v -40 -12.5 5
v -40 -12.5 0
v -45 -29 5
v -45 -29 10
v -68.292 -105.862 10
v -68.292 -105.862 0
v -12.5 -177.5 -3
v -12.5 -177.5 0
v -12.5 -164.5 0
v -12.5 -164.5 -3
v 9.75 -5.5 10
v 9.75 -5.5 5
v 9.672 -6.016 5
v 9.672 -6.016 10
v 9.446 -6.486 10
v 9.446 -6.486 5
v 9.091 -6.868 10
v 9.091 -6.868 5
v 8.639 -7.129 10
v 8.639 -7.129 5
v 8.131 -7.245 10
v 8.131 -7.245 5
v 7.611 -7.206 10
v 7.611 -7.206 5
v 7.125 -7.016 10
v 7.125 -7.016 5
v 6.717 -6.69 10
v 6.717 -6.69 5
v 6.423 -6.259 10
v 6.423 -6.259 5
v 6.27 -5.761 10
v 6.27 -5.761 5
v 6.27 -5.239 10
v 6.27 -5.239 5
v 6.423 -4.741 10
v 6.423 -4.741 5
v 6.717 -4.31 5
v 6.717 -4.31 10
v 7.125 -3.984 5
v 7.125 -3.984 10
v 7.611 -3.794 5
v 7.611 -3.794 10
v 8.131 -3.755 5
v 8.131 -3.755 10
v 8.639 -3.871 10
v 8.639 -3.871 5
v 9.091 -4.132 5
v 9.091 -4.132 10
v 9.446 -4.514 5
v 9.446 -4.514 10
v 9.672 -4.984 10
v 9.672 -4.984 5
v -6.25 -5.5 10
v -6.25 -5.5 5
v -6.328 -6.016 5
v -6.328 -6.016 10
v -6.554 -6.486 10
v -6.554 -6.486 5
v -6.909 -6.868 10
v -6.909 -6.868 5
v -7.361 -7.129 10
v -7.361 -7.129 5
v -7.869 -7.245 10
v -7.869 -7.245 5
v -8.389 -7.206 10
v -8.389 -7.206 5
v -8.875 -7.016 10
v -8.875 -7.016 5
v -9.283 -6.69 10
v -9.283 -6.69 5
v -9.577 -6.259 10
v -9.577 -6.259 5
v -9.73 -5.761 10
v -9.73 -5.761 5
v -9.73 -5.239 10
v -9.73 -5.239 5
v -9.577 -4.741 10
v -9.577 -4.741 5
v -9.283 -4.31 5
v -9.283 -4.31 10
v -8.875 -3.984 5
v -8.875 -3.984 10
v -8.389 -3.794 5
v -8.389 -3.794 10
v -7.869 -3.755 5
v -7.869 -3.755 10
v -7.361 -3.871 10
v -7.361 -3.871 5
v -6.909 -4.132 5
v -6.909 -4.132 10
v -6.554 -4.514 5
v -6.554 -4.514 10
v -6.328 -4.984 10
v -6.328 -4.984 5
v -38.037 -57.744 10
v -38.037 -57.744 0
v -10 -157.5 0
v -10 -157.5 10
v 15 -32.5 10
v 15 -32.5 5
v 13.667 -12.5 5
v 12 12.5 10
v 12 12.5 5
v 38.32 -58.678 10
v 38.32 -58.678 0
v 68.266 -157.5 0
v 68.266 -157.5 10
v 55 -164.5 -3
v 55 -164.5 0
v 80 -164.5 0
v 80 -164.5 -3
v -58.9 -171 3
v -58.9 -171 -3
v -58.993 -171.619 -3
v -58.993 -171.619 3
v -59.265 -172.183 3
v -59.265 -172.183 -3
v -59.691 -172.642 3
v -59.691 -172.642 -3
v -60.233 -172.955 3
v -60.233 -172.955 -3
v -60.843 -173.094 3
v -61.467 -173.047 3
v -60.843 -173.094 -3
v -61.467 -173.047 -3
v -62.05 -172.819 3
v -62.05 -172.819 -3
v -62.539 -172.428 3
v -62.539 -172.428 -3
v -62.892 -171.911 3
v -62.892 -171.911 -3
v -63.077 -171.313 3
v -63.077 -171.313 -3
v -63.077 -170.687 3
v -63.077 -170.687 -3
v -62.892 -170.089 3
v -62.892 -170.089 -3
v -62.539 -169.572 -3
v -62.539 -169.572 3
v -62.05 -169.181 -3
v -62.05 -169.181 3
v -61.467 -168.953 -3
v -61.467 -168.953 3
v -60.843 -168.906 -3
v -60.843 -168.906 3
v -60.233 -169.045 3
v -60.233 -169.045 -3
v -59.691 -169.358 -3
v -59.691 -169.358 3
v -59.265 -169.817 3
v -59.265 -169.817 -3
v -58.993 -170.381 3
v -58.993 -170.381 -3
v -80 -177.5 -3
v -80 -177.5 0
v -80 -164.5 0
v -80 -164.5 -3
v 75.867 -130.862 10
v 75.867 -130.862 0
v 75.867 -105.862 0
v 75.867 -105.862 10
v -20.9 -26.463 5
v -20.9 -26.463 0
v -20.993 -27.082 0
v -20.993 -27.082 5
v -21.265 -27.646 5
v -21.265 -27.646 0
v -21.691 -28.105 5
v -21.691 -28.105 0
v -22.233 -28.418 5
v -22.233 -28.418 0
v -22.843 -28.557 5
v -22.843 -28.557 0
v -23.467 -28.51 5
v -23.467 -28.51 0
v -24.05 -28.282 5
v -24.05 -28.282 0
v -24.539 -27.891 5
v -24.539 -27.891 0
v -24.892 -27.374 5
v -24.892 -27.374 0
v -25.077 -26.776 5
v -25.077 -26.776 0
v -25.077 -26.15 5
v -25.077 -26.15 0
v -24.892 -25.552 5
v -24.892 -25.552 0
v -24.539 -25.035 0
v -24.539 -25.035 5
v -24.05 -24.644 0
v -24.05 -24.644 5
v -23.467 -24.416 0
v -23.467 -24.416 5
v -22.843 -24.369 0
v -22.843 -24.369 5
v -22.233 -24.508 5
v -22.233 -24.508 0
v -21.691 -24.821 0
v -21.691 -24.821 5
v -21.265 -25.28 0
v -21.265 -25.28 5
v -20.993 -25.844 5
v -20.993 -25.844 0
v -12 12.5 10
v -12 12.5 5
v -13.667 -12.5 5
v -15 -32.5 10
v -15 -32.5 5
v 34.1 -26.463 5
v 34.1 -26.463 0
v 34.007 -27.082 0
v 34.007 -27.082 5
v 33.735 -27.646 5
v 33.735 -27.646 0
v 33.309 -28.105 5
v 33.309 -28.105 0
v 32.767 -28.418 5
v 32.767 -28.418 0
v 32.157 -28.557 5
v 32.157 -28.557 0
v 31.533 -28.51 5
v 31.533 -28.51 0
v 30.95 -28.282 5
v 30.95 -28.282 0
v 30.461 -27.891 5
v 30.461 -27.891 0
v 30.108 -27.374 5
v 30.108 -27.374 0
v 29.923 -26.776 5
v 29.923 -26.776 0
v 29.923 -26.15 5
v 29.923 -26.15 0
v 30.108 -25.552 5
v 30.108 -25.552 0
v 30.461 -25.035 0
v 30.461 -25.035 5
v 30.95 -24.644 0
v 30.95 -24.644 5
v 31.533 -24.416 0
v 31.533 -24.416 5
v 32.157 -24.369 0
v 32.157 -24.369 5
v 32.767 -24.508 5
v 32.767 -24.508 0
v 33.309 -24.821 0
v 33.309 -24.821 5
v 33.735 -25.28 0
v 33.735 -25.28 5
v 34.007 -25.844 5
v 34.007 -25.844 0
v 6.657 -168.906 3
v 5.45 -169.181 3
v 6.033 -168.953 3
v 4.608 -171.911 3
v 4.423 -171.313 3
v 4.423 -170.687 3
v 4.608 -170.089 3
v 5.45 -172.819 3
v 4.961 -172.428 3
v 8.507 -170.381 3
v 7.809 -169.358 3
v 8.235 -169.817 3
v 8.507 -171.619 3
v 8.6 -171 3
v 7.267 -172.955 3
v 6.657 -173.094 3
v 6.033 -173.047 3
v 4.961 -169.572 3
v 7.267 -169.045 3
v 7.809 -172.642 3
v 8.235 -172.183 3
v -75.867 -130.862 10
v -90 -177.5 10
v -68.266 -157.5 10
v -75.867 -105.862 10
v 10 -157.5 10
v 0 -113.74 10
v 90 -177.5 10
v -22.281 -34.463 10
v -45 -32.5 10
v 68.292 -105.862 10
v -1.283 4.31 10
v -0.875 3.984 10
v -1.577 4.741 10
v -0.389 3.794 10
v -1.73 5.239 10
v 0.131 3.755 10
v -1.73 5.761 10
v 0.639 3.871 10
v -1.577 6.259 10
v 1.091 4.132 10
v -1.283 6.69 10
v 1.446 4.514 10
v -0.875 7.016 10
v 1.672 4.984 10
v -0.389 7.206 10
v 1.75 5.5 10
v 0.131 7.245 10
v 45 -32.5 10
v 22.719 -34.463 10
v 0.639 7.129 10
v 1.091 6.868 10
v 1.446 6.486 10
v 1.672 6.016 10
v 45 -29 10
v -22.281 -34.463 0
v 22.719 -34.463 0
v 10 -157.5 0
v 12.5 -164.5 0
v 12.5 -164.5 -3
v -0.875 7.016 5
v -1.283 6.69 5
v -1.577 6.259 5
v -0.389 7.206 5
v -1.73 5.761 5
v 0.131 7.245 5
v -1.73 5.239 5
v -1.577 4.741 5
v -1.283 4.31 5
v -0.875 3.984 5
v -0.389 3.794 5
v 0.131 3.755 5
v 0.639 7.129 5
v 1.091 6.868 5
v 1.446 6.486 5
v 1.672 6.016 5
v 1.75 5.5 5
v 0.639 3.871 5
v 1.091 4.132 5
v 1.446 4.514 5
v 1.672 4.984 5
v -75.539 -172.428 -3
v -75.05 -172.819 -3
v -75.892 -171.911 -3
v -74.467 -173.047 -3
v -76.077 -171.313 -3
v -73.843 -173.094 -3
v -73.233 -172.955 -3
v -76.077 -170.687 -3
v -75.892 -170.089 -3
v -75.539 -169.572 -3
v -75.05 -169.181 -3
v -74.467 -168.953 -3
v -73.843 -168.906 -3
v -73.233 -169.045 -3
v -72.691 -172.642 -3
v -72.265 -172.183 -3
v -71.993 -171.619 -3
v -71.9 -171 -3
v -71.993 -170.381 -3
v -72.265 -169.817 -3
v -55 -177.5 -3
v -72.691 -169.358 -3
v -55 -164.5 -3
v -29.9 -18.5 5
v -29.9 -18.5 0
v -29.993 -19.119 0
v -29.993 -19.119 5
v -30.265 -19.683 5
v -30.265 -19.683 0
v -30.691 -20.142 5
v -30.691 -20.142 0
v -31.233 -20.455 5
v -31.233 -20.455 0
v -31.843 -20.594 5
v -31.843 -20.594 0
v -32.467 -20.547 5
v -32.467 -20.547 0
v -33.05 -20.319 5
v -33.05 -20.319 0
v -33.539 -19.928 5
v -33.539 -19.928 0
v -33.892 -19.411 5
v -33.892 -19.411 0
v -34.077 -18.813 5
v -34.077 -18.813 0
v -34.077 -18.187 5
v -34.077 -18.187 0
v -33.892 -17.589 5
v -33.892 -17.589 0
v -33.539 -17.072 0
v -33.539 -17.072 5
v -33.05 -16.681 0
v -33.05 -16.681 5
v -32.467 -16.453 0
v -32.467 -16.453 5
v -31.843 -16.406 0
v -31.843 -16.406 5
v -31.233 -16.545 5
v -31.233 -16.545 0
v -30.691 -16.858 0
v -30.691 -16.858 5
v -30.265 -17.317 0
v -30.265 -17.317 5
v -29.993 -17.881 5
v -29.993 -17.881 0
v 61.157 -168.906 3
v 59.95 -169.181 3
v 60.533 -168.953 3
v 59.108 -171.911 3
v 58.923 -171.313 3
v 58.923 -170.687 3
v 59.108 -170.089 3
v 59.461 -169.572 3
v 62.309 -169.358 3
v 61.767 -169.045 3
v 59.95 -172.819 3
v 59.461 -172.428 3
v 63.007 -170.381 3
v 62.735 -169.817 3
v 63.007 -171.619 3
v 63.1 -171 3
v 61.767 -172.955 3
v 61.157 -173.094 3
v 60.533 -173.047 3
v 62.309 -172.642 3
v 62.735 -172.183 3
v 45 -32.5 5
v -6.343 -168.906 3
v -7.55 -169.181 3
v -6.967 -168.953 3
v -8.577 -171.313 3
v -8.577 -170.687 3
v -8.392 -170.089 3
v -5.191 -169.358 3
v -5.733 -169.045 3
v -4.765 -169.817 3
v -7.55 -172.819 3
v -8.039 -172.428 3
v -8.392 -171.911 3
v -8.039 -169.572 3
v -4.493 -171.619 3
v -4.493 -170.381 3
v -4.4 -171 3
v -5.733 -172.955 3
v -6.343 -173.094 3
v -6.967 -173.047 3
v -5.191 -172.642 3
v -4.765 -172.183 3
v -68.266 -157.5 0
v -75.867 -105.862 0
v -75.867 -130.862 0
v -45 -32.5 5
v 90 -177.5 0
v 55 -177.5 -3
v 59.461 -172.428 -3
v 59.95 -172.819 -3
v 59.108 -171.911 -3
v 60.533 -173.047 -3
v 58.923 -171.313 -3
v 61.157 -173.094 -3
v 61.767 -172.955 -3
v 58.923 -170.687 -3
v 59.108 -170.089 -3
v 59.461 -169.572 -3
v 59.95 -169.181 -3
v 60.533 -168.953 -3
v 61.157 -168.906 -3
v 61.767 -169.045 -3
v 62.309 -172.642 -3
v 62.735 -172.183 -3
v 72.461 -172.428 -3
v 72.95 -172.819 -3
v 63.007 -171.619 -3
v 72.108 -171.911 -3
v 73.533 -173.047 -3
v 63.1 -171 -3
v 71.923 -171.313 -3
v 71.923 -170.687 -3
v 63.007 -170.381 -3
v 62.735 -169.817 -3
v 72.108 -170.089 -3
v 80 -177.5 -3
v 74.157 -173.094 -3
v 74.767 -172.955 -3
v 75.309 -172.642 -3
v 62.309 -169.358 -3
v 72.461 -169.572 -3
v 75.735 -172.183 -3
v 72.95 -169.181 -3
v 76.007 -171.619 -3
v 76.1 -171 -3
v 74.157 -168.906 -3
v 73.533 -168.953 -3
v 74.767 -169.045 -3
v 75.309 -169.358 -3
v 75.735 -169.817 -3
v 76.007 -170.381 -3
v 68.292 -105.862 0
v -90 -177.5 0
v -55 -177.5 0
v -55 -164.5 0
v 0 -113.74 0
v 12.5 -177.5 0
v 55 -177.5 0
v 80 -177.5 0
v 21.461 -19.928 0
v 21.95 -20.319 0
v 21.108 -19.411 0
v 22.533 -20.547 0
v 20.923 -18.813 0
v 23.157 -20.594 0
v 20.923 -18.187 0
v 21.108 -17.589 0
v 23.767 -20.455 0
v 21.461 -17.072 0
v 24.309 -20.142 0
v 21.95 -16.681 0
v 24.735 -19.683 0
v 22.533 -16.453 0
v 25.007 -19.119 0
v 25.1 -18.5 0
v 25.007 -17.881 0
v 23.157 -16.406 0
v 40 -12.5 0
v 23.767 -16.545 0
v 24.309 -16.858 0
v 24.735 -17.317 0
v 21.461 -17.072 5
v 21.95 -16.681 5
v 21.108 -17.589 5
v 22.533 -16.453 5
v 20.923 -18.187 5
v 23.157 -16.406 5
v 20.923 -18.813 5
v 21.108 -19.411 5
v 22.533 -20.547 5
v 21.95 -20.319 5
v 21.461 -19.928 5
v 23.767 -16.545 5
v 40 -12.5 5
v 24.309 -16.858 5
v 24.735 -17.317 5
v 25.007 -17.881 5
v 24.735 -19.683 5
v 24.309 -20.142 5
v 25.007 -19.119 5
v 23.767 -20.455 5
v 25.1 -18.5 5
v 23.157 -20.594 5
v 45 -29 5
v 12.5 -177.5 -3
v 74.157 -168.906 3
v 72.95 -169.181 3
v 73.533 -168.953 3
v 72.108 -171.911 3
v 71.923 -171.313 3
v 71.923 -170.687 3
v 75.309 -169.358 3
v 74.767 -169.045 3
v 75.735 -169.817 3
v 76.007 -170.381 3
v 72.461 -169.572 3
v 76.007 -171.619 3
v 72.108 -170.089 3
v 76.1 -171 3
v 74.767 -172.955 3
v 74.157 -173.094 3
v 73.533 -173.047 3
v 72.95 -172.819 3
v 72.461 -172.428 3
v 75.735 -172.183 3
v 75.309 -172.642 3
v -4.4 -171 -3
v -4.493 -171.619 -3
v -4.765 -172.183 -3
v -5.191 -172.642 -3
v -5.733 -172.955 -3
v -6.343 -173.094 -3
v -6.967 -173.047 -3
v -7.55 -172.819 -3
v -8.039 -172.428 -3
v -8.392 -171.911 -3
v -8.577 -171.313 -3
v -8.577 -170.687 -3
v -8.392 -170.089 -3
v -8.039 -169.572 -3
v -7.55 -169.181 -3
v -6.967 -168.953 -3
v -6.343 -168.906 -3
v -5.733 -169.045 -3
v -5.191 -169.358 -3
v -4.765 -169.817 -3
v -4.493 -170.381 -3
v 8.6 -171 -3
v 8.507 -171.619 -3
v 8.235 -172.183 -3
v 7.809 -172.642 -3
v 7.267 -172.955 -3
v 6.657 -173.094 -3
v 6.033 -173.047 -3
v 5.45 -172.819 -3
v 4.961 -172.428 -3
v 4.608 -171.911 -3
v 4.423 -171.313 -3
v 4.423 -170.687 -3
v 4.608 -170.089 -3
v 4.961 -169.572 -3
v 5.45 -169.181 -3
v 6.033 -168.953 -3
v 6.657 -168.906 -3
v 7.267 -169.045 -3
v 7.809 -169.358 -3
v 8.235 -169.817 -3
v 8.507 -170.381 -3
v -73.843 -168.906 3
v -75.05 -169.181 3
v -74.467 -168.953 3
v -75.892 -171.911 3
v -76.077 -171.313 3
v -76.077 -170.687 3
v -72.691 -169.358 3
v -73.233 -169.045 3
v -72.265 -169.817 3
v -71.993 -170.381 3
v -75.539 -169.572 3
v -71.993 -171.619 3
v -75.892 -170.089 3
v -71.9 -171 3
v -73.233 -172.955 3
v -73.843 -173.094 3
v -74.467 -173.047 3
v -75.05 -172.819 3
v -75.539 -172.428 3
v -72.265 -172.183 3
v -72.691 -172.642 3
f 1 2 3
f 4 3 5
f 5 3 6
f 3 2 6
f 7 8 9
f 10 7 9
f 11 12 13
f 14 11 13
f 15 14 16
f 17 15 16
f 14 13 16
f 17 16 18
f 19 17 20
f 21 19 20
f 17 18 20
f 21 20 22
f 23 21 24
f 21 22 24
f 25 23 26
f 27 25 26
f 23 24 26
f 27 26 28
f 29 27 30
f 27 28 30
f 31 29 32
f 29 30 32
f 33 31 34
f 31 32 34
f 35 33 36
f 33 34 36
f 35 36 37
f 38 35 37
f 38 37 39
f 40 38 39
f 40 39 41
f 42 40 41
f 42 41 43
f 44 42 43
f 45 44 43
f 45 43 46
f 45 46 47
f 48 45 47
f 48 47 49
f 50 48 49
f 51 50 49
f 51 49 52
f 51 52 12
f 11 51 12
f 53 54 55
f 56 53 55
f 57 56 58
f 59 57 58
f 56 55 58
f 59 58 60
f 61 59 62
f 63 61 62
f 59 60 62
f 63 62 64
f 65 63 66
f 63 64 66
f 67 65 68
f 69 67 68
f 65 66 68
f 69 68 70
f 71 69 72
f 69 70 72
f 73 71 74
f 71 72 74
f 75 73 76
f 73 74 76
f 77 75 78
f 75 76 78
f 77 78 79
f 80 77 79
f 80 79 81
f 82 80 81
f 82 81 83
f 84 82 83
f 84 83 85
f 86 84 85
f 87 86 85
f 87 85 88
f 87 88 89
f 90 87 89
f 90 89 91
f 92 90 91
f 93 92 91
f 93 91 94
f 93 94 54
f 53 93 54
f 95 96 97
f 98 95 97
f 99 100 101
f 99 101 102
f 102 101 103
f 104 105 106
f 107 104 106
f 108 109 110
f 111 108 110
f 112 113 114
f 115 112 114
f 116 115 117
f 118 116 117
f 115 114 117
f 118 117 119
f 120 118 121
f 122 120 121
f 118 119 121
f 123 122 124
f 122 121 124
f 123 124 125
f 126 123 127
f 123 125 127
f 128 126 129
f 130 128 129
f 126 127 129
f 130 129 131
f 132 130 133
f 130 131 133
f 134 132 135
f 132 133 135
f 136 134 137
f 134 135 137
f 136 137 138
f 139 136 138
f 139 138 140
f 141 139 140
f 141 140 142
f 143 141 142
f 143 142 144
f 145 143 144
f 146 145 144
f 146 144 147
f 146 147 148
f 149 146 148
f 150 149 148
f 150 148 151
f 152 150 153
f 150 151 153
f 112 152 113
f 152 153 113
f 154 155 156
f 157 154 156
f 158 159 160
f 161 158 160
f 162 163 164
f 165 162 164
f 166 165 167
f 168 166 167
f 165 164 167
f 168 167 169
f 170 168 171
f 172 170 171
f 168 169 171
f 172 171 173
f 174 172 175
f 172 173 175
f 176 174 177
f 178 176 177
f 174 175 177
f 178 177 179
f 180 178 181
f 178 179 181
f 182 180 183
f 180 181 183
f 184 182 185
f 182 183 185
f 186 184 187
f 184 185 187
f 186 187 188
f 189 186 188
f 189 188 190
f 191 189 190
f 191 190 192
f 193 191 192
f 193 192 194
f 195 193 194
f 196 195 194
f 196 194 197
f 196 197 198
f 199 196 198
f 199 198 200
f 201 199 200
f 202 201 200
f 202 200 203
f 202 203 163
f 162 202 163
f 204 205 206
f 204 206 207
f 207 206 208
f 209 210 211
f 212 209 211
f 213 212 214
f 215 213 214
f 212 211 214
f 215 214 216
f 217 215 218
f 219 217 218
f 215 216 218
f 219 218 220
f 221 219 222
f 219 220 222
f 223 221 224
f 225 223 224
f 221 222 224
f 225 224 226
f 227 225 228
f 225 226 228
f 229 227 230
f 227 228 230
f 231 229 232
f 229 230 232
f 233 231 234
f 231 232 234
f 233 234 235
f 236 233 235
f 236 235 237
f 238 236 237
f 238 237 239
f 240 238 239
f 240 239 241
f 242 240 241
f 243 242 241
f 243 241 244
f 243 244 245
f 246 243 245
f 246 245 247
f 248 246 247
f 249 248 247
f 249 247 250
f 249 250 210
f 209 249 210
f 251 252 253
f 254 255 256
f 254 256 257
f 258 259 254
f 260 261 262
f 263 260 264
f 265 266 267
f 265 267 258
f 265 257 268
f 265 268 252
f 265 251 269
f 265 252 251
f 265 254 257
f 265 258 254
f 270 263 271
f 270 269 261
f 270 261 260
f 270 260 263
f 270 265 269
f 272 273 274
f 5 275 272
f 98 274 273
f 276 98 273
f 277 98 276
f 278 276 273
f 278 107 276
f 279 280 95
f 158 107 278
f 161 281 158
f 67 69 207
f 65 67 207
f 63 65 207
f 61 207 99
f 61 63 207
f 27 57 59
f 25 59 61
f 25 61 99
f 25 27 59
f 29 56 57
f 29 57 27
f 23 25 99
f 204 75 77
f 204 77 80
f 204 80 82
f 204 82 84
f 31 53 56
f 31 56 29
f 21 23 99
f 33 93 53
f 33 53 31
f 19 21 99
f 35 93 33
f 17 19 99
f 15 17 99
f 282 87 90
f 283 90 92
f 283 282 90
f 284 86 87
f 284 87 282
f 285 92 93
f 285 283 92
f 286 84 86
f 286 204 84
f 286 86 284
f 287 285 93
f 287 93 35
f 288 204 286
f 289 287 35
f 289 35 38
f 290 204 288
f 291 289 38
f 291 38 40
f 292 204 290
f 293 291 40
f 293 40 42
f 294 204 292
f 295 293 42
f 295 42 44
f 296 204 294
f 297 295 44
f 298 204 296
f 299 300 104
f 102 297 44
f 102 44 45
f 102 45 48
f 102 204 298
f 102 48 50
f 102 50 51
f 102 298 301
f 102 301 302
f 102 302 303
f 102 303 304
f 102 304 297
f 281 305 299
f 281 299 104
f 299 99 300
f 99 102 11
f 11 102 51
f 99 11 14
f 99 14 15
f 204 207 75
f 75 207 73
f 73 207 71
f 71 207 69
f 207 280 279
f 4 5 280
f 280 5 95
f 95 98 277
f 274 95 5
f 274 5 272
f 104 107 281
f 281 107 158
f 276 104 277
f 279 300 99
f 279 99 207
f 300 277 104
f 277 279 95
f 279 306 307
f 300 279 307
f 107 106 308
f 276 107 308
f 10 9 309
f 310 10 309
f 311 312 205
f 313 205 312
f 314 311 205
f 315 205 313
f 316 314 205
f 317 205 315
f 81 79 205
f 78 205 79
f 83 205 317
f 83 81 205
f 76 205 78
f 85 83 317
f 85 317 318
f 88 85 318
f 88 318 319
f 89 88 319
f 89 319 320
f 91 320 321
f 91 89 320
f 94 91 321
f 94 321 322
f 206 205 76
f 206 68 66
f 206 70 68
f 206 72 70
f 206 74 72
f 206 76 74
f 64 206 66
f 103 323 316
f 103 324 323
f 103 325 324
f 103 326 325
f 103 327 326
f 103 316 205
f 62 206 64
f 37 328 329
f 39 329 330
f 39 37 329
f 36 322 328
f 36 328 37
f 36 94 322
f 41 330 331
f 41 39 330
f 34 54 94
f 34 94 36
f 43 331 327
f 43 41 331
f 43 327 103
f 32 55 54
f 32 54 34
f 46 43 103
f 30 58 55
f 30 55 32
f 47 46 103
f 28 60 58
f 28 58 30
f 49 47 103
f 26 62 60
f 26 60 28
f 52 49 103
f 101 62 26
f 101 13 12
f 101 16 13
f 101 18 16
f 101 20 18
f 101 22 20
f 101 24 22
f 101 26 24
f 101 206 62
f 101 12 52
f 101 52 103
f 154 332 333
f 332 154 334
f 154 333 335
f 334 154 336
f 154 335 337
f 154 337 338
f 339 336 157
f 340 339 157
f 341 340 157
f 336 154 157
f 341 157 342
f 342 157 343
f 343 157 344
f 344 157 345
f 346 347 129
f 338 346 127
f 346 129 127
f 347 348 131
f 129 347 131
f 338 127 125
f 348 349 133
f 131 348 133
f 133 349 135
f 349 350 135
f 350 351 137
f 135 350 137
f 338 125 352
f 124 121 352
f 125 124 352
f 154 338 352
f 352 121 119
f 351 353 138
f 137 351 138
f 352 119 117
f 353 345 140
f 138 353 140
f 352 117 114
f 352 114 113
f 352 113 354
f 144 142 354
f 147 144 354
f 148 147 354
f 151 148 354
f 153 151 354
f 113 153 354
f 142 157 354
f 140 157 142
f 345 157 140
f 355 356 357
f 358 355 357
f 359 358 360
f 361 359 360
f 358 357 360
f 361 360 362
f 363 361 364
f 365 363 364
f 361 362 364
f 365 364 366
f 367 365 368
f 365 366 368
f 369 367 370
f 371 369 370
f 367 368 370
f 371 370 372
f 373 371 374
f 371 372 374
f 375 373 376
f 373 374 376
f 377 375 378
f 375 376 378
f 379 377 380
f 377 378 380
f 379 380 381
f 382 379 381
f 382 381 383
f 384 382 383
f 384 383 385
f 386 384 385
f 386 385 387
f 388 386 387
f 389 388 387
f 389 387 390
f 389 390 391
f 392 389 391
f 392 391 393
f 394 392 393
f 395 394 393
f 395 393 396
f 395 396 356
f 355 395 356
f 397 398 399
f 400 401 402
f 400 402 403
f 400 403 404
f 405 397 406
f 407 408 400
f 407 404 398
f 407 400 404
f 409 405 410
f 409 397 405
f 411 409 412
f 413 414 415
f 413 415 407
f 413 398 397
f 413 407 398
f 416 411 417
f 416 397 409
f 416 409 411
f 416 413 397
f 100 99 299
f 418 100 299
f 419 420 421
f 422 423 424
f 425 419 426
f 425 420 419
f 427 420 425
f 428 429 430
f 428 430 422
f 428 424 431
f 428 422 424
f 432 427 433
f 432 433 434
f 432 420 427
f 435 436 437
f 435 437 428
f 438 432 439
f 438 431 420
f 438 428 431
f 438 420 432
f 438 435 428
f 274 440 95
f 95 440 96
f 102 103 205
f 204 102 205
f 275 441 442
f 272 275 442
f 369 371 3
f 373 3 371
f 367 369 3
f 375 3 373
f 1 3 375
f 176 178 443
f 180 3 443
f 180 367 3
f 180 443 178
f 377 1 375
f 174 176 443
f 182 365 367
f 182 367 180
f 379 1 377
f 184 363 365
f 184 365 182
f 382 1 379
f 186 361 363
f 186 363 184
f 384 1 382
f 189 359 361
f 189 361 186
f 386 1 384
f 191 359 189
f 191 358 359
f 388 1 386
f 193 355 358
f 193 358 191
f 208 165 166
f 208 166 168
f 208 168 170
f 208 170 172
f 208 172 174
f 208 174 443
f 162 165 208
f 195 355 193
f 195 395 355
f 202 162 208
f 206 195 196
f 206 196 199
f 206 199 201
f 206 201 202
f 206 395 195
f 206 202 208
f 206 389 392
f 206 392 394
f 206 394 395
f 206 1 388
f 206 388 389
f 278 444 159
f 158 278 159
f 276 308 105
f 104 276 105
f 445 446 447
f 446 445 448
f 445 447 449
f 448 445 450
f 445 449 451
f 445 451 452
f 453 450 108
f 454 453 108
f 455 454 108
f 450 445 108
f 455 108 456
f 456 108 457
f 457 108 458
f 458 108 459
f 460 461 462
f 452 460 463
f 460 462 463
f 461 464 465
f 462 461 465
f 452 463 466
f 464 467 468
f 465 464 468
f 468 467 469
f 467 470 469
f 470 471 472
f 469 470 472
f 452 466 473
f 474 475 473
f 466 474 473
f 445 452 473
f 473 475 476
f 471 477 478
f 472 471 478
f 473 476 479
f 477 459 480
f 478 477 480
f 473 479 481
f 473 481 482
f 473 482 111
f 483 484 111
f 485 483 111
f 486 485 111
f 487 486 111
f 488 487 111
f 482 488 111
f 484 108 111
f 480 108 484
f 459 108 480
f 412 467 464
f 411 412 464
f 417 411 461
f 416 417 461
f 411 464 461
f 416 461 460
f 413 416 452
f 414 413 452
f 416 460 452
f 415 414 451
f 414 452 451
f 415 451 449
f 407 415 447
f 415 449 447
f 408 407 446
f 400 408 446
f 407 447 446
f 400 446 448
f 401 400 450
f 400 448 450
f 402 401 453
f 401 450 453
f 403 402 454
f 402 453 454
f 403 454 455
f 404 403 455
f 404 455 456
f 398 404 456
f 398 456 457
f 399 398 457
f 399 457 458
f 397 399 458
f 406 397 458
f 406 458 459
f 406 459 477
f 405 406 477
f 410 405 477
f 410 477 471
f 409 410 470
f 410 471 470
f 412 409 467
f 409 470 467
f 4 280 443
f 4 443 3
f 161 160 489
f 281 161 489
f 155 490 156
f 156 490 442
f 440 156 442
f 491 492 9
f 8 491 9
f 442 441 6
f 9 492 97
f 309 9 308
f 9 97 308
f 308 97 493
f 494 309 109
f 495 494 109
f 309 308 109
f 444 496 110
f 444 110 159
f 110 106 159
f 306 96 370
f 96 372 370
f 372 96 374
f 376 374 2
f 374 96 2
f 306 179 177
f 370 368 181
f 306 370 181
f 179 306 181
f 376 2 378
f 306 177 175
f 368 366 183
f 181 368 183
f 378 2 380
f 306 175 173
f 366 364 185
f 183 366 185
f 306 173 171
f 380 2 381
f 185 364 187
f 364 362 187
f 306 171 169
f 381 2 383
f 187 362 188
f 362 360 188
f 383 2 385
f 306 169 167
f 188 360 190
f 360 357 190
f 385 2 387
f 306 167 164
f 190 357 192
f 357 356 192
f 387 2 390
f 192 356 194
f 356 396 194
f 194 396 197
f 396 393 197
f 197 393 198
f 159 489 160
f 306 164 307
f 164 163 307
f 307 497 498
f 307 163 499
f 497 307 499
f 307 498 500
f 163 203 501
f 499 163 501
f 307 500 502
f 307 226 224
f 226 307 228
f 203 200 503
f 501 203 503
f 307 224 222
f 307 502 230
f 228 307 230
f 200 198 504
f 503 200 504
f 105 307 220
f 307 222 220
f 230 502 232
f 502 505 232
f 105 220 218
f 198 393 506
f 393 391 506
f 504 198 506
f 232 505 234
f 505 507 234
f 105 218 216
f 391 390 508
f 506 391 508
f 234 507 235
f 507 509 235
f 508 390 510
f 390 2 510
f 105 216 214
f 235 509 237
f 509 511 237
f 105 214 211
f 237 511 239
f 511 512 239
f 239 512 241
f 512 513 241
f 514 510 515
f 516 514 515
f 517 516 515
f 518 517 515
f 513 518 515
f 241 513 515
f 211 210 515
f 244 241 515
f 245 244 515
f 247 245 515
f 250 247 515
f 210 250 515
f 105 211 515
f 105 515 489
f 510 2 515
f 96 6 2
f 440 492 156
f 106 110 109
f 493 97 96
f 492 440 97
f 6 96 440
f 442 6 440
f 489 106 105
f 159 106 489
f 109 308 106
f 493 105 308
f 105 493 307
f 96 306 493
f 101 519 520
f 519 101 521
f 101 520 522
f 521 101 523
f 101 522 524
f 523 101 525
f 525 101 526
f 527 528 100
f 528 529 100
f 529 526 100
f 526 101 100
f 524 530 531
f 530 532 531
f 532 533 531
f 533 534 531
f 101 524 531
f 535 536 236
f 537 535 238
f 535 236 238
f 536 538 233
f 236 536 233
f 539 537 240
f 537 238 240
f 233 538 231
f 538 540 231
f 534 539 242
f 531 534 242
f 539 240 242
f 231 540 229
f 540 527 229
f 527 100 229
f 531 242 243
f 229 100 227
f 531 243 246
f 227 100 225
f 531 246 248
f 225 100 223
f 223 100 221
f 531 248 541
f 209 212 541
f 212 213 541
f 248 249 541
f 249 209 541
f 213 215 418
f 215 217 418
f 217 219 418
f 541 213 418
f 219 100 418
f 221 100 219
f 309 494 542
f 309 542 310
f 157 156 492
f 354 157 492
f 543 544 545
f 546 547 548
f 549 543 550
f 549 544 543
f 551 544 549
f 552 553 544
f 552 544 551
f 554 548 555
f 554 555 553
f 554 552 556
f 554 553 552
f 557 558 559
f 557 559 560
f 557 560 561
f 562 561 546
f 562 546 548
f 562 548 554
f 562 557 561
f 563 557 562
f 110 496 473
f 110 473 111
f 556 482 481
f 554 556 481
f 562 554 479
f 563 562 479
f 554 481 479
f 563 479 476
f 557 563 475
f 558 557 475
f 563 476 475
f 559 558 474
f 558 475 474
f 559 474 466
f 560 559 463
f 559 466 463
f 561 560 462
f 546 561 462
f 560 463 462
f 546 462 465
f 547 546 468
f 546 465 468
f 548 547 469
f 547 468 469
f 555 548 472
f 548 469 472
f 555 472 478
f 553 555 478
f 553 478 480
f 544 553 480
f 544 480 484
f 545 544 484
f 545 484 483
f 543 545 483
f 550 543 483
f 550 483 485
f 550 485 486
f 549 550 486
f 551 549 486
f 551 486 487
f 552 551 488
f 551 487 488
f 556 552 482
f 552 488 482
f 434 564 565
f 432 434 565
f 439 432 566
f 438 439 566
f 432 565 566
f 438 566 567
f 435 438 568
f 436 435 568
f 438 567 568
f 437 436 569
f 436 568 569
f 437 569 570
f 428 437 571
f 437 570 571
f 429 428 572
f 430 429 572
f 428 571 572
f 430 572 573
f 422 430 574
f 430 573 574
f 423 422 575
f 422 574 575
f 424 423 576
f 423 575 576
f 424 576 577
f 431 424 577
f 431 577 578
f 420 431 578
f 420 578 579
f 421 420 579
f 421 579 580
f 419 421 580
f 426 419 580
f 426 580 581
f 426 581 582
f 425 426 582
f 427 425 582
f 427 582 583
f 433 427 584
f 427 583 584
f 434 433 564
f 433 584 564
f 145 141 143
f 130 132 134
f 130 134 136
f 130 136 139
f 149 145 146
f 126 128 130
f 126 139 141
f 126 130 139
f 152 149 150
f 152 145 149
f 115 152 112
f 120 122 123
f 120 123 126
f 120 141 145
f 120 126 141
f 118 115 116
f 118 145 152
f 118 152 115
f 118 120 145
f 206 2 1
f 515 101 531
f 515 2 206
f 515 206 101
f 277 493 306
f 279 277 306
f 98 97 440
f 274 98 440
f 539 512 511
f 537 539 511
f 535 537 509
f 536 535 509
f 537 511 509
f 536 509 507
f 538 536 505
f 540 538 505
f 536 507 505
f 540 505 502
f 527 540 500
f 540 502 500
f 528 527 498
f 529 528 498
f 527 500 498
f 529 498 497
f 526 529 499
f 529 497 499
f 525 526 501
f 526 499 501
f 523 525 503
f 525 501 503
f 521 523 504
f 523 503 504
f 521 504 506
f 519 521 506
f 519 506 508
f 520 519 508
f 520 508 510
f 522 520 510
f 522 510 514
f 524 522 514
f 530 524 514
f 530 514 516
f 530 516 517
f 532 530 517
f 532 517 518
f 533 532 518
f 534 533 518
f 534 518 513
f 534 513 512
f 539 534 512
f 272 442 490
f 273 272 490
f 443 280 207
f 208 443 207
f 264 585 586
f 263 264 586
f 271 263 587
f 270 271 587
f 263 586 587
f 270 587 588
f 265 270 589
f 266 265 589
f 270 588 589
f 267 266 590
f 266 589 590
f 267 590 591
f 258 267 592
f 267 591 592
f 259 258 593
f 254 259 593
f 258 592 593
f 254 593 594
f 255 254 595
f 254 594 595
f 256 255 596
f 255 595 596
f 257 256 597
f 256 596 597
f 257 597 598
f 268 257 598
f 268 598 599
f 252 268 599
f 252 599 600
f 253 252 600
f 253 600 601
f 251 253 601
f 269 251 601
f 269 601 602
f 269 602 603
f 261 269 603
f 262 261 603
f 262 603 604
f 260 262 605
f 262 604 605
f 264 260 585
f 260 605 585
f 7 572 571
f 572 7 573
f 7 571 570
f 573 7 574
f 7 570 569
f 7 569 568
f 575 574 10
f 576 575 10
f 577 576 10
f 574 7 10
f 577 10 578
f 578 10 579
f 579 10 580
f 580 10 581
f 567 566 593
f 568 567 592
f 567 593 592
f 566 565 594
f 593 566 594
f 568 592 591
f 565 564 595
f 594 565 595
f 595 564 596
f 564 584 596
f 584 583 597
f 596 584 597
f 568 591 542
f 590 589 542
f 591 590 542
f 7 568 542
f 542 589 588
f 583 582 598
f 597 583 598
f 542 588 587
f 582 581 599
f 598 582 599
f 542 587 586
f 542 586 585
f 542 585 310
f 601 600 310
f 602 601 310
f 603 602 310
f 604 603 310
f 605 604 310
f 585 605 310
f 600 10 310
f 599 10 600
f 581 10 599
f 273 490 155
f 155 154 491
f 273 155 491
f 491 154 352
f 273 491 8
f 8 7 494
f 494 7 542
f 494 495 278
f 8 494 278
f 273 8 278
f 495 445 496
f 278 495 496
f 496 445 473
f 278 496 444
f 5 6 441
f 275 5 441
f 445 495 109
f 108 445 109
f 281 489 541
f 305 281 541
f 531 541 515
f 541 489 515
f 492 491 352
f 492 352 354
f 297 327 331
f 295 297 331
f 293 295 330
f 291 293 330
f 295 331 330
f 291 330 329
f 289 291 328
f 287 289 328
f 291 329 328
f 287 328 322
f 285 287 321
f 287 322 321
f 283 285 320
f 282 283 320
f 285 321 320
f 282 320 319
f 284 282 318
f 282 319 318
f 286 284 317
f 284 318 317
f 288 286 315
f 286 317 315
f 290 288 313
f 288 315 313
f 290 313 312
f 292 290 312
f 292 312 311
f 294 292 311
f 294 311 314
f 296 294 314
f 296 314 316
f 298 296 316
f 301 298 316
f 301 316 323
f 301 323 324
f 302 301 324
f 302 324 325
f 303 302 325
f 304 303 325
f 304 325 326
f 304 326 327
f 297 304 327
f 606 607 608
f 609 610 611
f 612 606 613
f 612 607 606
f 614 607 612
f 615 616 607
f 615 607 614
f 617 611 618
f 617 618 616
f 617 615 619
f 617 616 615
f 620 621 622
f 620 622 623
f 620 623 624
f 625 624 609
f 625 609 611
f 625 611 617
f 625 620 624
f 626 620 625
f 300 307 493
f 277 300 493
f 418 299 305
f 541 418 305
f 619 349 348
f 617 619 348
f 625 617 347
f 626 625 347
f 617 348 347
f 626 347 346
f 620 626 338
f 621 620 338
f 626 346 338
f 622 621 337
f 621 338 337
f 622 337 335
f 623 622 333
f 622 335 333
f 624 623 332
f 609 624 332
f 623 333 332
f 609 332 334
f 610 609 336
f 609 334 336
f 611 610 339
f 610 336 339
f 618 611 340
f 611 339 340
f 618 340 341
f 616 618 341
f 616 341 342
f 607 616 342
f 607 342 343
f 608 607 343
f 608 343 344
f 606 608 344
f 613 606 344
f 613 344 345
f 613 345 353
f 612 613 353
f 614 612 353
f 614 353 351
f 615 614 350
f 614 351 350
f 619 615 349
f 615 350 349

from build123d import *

# Parameters (mm, degrees)
F1_DEPTH  = 10
F2_W      = 30
F2_H      = 25
F3_DEPTH  = 5
F4_W      = 30
F4_H      = 20
F5_DEPTH  = 5
F6_W      = 25
F6_H      = 13
F7_DEPTH  = 13
F8_R      = 2.1
F9_DEPTH  = 6
F11_DEPTH = 25
F12_R     = 1.75
F12_R_2   = 2.1
F13_DEPTH = 25


with BuildPart() as f1:
    # F0 (on Top) → F1 (new body)
    with BuildSketch(Plane.XY):
        Polygon((15, 12.5), (-15, 12.5), (-15, -12.5), (-40, -12.5), (-68.291549, -105.862112), (-75.867307, -105.862112), (-75.867307, -130.862112), (-90, -177.5), (90, -177.5), (75.867307, -130.862112), (75.867307, -105.862112), (68.291549, -105.862112), (40, -12.5), (15, -12.5), align=None)
        Polygon((-10, -157.5), (-68.265812, -157.5), (-38.036853, -57.744435), align=None, mode=Mode.SUBTRACT)
        Polygon((68.265812, -157.5), (10, -157.5), (38.319605, -58.677516), align=None, mode=Mode.SUBTRACT)
        Polygon((0, -113.740444), (-22.281395, -34.462891), (22.718605, -34.462891), align=None, mode=Mode.SUBTRACT)
    extrude(amount=F1_DEPTH)

    # F2 (on face) → F3 (cut)
    with BuildSketch(Plane(origin=(0, 0, 0), x_dir=(1, 0, 0), z_dir=(0, 0, -1))):
        Rectangle(F2_W, F2_H)
    extrude(amount=-F3_DEPTH, mode=Mode.SUBTRACT)

    # F4 (on face) → F5 (cut)
    with BuildSketch(Plane.XY.offset(10)):
        with Locations((-30, -22.5)):
            Rectangle(F4_W, F4_H)
        with Locations((30, -22.5)):
            Rectangle(F4_W, F4_H)
    extrude(amount=-F5_DEPTH, mode=Mode.SUBTRACT)

    # F6 (on face) → F7 (join)
    with BuildSketch(Plane.XY.offset(10)):
        with Locations((-67.5, -171)):
            Rectangle(F6_W, F6_H)
        with Locations((0, -171)):
            Rectangle(F6_W, F6_H)
        with Locations((67.5, -171)):
            Rectangle(F6_W, F6_H)
    extrude(amount=-F7_DEPTH)

    # F8 (on face) → F9 (cut)
    with BuildSketch(Plane(origin=(0, 0, -3), x_dir=(1, 0, 0), z_dir=(0, 0, -1))):
        with Locations((-74, 171)):
            Circle(F8_R)
        with Locations((-61, 171)):
            Circle(F8_R)
        with Locations((-6.5, 171)):
            Circle(F8_R)
        with Locations((6.5, 171)):
            Circle(F8_R)
        with Locations((61, 171)):
            Circle(F8_R)
        with Locations((74, 171)):
            Circle(F8_R)
    extrude(amount=-F9_DEPTH, mode=Mode.SUBTRACT)

    # F10 (on face) → F11 (cut)
    with BuildSketch(Plane(origin=(0, 0, 5), x_dir=(1, 0, 0), z_dir=(0, 0, -1))):
        Polygon((-15, 32.5), (-15, -12.5), (-12, -12.5), align=None)
        Polygon((12, -12.5), (15, -12.5), (15, 32.5), align=None)
    extrude(amount=-F11_DEPTH, mode=Mode.SUBTRACT)

    # F12 (on face) → F13 (cut)
    with BuildSketch(Plane(origin=(0, 0, 0), x_dir=(1, 0, 0), z_dir=(0, 0, -1))):
        with Locations((0, -5.5)):
            Circle(F12_R)
        with Locations((-8, 5.5)):
            Circle(F12_R)
        with Locations((8, 5.5)):
            Circle(F12_R)
        with Locations((32, 26.462891)):
            Circle(F12_R_2)
        with Locations((23, 18.5)):
            Circle(F12_R_2)
        with Locations((-23, 26.462891)):
            Circle(F12_R_2)
        with Locations((-32, 18.5)):
            Circle(F12_R_2)
    extrude(amount=-F13_DEPTH, mode=Mode.SUBTRACT)


solid = f1.part
